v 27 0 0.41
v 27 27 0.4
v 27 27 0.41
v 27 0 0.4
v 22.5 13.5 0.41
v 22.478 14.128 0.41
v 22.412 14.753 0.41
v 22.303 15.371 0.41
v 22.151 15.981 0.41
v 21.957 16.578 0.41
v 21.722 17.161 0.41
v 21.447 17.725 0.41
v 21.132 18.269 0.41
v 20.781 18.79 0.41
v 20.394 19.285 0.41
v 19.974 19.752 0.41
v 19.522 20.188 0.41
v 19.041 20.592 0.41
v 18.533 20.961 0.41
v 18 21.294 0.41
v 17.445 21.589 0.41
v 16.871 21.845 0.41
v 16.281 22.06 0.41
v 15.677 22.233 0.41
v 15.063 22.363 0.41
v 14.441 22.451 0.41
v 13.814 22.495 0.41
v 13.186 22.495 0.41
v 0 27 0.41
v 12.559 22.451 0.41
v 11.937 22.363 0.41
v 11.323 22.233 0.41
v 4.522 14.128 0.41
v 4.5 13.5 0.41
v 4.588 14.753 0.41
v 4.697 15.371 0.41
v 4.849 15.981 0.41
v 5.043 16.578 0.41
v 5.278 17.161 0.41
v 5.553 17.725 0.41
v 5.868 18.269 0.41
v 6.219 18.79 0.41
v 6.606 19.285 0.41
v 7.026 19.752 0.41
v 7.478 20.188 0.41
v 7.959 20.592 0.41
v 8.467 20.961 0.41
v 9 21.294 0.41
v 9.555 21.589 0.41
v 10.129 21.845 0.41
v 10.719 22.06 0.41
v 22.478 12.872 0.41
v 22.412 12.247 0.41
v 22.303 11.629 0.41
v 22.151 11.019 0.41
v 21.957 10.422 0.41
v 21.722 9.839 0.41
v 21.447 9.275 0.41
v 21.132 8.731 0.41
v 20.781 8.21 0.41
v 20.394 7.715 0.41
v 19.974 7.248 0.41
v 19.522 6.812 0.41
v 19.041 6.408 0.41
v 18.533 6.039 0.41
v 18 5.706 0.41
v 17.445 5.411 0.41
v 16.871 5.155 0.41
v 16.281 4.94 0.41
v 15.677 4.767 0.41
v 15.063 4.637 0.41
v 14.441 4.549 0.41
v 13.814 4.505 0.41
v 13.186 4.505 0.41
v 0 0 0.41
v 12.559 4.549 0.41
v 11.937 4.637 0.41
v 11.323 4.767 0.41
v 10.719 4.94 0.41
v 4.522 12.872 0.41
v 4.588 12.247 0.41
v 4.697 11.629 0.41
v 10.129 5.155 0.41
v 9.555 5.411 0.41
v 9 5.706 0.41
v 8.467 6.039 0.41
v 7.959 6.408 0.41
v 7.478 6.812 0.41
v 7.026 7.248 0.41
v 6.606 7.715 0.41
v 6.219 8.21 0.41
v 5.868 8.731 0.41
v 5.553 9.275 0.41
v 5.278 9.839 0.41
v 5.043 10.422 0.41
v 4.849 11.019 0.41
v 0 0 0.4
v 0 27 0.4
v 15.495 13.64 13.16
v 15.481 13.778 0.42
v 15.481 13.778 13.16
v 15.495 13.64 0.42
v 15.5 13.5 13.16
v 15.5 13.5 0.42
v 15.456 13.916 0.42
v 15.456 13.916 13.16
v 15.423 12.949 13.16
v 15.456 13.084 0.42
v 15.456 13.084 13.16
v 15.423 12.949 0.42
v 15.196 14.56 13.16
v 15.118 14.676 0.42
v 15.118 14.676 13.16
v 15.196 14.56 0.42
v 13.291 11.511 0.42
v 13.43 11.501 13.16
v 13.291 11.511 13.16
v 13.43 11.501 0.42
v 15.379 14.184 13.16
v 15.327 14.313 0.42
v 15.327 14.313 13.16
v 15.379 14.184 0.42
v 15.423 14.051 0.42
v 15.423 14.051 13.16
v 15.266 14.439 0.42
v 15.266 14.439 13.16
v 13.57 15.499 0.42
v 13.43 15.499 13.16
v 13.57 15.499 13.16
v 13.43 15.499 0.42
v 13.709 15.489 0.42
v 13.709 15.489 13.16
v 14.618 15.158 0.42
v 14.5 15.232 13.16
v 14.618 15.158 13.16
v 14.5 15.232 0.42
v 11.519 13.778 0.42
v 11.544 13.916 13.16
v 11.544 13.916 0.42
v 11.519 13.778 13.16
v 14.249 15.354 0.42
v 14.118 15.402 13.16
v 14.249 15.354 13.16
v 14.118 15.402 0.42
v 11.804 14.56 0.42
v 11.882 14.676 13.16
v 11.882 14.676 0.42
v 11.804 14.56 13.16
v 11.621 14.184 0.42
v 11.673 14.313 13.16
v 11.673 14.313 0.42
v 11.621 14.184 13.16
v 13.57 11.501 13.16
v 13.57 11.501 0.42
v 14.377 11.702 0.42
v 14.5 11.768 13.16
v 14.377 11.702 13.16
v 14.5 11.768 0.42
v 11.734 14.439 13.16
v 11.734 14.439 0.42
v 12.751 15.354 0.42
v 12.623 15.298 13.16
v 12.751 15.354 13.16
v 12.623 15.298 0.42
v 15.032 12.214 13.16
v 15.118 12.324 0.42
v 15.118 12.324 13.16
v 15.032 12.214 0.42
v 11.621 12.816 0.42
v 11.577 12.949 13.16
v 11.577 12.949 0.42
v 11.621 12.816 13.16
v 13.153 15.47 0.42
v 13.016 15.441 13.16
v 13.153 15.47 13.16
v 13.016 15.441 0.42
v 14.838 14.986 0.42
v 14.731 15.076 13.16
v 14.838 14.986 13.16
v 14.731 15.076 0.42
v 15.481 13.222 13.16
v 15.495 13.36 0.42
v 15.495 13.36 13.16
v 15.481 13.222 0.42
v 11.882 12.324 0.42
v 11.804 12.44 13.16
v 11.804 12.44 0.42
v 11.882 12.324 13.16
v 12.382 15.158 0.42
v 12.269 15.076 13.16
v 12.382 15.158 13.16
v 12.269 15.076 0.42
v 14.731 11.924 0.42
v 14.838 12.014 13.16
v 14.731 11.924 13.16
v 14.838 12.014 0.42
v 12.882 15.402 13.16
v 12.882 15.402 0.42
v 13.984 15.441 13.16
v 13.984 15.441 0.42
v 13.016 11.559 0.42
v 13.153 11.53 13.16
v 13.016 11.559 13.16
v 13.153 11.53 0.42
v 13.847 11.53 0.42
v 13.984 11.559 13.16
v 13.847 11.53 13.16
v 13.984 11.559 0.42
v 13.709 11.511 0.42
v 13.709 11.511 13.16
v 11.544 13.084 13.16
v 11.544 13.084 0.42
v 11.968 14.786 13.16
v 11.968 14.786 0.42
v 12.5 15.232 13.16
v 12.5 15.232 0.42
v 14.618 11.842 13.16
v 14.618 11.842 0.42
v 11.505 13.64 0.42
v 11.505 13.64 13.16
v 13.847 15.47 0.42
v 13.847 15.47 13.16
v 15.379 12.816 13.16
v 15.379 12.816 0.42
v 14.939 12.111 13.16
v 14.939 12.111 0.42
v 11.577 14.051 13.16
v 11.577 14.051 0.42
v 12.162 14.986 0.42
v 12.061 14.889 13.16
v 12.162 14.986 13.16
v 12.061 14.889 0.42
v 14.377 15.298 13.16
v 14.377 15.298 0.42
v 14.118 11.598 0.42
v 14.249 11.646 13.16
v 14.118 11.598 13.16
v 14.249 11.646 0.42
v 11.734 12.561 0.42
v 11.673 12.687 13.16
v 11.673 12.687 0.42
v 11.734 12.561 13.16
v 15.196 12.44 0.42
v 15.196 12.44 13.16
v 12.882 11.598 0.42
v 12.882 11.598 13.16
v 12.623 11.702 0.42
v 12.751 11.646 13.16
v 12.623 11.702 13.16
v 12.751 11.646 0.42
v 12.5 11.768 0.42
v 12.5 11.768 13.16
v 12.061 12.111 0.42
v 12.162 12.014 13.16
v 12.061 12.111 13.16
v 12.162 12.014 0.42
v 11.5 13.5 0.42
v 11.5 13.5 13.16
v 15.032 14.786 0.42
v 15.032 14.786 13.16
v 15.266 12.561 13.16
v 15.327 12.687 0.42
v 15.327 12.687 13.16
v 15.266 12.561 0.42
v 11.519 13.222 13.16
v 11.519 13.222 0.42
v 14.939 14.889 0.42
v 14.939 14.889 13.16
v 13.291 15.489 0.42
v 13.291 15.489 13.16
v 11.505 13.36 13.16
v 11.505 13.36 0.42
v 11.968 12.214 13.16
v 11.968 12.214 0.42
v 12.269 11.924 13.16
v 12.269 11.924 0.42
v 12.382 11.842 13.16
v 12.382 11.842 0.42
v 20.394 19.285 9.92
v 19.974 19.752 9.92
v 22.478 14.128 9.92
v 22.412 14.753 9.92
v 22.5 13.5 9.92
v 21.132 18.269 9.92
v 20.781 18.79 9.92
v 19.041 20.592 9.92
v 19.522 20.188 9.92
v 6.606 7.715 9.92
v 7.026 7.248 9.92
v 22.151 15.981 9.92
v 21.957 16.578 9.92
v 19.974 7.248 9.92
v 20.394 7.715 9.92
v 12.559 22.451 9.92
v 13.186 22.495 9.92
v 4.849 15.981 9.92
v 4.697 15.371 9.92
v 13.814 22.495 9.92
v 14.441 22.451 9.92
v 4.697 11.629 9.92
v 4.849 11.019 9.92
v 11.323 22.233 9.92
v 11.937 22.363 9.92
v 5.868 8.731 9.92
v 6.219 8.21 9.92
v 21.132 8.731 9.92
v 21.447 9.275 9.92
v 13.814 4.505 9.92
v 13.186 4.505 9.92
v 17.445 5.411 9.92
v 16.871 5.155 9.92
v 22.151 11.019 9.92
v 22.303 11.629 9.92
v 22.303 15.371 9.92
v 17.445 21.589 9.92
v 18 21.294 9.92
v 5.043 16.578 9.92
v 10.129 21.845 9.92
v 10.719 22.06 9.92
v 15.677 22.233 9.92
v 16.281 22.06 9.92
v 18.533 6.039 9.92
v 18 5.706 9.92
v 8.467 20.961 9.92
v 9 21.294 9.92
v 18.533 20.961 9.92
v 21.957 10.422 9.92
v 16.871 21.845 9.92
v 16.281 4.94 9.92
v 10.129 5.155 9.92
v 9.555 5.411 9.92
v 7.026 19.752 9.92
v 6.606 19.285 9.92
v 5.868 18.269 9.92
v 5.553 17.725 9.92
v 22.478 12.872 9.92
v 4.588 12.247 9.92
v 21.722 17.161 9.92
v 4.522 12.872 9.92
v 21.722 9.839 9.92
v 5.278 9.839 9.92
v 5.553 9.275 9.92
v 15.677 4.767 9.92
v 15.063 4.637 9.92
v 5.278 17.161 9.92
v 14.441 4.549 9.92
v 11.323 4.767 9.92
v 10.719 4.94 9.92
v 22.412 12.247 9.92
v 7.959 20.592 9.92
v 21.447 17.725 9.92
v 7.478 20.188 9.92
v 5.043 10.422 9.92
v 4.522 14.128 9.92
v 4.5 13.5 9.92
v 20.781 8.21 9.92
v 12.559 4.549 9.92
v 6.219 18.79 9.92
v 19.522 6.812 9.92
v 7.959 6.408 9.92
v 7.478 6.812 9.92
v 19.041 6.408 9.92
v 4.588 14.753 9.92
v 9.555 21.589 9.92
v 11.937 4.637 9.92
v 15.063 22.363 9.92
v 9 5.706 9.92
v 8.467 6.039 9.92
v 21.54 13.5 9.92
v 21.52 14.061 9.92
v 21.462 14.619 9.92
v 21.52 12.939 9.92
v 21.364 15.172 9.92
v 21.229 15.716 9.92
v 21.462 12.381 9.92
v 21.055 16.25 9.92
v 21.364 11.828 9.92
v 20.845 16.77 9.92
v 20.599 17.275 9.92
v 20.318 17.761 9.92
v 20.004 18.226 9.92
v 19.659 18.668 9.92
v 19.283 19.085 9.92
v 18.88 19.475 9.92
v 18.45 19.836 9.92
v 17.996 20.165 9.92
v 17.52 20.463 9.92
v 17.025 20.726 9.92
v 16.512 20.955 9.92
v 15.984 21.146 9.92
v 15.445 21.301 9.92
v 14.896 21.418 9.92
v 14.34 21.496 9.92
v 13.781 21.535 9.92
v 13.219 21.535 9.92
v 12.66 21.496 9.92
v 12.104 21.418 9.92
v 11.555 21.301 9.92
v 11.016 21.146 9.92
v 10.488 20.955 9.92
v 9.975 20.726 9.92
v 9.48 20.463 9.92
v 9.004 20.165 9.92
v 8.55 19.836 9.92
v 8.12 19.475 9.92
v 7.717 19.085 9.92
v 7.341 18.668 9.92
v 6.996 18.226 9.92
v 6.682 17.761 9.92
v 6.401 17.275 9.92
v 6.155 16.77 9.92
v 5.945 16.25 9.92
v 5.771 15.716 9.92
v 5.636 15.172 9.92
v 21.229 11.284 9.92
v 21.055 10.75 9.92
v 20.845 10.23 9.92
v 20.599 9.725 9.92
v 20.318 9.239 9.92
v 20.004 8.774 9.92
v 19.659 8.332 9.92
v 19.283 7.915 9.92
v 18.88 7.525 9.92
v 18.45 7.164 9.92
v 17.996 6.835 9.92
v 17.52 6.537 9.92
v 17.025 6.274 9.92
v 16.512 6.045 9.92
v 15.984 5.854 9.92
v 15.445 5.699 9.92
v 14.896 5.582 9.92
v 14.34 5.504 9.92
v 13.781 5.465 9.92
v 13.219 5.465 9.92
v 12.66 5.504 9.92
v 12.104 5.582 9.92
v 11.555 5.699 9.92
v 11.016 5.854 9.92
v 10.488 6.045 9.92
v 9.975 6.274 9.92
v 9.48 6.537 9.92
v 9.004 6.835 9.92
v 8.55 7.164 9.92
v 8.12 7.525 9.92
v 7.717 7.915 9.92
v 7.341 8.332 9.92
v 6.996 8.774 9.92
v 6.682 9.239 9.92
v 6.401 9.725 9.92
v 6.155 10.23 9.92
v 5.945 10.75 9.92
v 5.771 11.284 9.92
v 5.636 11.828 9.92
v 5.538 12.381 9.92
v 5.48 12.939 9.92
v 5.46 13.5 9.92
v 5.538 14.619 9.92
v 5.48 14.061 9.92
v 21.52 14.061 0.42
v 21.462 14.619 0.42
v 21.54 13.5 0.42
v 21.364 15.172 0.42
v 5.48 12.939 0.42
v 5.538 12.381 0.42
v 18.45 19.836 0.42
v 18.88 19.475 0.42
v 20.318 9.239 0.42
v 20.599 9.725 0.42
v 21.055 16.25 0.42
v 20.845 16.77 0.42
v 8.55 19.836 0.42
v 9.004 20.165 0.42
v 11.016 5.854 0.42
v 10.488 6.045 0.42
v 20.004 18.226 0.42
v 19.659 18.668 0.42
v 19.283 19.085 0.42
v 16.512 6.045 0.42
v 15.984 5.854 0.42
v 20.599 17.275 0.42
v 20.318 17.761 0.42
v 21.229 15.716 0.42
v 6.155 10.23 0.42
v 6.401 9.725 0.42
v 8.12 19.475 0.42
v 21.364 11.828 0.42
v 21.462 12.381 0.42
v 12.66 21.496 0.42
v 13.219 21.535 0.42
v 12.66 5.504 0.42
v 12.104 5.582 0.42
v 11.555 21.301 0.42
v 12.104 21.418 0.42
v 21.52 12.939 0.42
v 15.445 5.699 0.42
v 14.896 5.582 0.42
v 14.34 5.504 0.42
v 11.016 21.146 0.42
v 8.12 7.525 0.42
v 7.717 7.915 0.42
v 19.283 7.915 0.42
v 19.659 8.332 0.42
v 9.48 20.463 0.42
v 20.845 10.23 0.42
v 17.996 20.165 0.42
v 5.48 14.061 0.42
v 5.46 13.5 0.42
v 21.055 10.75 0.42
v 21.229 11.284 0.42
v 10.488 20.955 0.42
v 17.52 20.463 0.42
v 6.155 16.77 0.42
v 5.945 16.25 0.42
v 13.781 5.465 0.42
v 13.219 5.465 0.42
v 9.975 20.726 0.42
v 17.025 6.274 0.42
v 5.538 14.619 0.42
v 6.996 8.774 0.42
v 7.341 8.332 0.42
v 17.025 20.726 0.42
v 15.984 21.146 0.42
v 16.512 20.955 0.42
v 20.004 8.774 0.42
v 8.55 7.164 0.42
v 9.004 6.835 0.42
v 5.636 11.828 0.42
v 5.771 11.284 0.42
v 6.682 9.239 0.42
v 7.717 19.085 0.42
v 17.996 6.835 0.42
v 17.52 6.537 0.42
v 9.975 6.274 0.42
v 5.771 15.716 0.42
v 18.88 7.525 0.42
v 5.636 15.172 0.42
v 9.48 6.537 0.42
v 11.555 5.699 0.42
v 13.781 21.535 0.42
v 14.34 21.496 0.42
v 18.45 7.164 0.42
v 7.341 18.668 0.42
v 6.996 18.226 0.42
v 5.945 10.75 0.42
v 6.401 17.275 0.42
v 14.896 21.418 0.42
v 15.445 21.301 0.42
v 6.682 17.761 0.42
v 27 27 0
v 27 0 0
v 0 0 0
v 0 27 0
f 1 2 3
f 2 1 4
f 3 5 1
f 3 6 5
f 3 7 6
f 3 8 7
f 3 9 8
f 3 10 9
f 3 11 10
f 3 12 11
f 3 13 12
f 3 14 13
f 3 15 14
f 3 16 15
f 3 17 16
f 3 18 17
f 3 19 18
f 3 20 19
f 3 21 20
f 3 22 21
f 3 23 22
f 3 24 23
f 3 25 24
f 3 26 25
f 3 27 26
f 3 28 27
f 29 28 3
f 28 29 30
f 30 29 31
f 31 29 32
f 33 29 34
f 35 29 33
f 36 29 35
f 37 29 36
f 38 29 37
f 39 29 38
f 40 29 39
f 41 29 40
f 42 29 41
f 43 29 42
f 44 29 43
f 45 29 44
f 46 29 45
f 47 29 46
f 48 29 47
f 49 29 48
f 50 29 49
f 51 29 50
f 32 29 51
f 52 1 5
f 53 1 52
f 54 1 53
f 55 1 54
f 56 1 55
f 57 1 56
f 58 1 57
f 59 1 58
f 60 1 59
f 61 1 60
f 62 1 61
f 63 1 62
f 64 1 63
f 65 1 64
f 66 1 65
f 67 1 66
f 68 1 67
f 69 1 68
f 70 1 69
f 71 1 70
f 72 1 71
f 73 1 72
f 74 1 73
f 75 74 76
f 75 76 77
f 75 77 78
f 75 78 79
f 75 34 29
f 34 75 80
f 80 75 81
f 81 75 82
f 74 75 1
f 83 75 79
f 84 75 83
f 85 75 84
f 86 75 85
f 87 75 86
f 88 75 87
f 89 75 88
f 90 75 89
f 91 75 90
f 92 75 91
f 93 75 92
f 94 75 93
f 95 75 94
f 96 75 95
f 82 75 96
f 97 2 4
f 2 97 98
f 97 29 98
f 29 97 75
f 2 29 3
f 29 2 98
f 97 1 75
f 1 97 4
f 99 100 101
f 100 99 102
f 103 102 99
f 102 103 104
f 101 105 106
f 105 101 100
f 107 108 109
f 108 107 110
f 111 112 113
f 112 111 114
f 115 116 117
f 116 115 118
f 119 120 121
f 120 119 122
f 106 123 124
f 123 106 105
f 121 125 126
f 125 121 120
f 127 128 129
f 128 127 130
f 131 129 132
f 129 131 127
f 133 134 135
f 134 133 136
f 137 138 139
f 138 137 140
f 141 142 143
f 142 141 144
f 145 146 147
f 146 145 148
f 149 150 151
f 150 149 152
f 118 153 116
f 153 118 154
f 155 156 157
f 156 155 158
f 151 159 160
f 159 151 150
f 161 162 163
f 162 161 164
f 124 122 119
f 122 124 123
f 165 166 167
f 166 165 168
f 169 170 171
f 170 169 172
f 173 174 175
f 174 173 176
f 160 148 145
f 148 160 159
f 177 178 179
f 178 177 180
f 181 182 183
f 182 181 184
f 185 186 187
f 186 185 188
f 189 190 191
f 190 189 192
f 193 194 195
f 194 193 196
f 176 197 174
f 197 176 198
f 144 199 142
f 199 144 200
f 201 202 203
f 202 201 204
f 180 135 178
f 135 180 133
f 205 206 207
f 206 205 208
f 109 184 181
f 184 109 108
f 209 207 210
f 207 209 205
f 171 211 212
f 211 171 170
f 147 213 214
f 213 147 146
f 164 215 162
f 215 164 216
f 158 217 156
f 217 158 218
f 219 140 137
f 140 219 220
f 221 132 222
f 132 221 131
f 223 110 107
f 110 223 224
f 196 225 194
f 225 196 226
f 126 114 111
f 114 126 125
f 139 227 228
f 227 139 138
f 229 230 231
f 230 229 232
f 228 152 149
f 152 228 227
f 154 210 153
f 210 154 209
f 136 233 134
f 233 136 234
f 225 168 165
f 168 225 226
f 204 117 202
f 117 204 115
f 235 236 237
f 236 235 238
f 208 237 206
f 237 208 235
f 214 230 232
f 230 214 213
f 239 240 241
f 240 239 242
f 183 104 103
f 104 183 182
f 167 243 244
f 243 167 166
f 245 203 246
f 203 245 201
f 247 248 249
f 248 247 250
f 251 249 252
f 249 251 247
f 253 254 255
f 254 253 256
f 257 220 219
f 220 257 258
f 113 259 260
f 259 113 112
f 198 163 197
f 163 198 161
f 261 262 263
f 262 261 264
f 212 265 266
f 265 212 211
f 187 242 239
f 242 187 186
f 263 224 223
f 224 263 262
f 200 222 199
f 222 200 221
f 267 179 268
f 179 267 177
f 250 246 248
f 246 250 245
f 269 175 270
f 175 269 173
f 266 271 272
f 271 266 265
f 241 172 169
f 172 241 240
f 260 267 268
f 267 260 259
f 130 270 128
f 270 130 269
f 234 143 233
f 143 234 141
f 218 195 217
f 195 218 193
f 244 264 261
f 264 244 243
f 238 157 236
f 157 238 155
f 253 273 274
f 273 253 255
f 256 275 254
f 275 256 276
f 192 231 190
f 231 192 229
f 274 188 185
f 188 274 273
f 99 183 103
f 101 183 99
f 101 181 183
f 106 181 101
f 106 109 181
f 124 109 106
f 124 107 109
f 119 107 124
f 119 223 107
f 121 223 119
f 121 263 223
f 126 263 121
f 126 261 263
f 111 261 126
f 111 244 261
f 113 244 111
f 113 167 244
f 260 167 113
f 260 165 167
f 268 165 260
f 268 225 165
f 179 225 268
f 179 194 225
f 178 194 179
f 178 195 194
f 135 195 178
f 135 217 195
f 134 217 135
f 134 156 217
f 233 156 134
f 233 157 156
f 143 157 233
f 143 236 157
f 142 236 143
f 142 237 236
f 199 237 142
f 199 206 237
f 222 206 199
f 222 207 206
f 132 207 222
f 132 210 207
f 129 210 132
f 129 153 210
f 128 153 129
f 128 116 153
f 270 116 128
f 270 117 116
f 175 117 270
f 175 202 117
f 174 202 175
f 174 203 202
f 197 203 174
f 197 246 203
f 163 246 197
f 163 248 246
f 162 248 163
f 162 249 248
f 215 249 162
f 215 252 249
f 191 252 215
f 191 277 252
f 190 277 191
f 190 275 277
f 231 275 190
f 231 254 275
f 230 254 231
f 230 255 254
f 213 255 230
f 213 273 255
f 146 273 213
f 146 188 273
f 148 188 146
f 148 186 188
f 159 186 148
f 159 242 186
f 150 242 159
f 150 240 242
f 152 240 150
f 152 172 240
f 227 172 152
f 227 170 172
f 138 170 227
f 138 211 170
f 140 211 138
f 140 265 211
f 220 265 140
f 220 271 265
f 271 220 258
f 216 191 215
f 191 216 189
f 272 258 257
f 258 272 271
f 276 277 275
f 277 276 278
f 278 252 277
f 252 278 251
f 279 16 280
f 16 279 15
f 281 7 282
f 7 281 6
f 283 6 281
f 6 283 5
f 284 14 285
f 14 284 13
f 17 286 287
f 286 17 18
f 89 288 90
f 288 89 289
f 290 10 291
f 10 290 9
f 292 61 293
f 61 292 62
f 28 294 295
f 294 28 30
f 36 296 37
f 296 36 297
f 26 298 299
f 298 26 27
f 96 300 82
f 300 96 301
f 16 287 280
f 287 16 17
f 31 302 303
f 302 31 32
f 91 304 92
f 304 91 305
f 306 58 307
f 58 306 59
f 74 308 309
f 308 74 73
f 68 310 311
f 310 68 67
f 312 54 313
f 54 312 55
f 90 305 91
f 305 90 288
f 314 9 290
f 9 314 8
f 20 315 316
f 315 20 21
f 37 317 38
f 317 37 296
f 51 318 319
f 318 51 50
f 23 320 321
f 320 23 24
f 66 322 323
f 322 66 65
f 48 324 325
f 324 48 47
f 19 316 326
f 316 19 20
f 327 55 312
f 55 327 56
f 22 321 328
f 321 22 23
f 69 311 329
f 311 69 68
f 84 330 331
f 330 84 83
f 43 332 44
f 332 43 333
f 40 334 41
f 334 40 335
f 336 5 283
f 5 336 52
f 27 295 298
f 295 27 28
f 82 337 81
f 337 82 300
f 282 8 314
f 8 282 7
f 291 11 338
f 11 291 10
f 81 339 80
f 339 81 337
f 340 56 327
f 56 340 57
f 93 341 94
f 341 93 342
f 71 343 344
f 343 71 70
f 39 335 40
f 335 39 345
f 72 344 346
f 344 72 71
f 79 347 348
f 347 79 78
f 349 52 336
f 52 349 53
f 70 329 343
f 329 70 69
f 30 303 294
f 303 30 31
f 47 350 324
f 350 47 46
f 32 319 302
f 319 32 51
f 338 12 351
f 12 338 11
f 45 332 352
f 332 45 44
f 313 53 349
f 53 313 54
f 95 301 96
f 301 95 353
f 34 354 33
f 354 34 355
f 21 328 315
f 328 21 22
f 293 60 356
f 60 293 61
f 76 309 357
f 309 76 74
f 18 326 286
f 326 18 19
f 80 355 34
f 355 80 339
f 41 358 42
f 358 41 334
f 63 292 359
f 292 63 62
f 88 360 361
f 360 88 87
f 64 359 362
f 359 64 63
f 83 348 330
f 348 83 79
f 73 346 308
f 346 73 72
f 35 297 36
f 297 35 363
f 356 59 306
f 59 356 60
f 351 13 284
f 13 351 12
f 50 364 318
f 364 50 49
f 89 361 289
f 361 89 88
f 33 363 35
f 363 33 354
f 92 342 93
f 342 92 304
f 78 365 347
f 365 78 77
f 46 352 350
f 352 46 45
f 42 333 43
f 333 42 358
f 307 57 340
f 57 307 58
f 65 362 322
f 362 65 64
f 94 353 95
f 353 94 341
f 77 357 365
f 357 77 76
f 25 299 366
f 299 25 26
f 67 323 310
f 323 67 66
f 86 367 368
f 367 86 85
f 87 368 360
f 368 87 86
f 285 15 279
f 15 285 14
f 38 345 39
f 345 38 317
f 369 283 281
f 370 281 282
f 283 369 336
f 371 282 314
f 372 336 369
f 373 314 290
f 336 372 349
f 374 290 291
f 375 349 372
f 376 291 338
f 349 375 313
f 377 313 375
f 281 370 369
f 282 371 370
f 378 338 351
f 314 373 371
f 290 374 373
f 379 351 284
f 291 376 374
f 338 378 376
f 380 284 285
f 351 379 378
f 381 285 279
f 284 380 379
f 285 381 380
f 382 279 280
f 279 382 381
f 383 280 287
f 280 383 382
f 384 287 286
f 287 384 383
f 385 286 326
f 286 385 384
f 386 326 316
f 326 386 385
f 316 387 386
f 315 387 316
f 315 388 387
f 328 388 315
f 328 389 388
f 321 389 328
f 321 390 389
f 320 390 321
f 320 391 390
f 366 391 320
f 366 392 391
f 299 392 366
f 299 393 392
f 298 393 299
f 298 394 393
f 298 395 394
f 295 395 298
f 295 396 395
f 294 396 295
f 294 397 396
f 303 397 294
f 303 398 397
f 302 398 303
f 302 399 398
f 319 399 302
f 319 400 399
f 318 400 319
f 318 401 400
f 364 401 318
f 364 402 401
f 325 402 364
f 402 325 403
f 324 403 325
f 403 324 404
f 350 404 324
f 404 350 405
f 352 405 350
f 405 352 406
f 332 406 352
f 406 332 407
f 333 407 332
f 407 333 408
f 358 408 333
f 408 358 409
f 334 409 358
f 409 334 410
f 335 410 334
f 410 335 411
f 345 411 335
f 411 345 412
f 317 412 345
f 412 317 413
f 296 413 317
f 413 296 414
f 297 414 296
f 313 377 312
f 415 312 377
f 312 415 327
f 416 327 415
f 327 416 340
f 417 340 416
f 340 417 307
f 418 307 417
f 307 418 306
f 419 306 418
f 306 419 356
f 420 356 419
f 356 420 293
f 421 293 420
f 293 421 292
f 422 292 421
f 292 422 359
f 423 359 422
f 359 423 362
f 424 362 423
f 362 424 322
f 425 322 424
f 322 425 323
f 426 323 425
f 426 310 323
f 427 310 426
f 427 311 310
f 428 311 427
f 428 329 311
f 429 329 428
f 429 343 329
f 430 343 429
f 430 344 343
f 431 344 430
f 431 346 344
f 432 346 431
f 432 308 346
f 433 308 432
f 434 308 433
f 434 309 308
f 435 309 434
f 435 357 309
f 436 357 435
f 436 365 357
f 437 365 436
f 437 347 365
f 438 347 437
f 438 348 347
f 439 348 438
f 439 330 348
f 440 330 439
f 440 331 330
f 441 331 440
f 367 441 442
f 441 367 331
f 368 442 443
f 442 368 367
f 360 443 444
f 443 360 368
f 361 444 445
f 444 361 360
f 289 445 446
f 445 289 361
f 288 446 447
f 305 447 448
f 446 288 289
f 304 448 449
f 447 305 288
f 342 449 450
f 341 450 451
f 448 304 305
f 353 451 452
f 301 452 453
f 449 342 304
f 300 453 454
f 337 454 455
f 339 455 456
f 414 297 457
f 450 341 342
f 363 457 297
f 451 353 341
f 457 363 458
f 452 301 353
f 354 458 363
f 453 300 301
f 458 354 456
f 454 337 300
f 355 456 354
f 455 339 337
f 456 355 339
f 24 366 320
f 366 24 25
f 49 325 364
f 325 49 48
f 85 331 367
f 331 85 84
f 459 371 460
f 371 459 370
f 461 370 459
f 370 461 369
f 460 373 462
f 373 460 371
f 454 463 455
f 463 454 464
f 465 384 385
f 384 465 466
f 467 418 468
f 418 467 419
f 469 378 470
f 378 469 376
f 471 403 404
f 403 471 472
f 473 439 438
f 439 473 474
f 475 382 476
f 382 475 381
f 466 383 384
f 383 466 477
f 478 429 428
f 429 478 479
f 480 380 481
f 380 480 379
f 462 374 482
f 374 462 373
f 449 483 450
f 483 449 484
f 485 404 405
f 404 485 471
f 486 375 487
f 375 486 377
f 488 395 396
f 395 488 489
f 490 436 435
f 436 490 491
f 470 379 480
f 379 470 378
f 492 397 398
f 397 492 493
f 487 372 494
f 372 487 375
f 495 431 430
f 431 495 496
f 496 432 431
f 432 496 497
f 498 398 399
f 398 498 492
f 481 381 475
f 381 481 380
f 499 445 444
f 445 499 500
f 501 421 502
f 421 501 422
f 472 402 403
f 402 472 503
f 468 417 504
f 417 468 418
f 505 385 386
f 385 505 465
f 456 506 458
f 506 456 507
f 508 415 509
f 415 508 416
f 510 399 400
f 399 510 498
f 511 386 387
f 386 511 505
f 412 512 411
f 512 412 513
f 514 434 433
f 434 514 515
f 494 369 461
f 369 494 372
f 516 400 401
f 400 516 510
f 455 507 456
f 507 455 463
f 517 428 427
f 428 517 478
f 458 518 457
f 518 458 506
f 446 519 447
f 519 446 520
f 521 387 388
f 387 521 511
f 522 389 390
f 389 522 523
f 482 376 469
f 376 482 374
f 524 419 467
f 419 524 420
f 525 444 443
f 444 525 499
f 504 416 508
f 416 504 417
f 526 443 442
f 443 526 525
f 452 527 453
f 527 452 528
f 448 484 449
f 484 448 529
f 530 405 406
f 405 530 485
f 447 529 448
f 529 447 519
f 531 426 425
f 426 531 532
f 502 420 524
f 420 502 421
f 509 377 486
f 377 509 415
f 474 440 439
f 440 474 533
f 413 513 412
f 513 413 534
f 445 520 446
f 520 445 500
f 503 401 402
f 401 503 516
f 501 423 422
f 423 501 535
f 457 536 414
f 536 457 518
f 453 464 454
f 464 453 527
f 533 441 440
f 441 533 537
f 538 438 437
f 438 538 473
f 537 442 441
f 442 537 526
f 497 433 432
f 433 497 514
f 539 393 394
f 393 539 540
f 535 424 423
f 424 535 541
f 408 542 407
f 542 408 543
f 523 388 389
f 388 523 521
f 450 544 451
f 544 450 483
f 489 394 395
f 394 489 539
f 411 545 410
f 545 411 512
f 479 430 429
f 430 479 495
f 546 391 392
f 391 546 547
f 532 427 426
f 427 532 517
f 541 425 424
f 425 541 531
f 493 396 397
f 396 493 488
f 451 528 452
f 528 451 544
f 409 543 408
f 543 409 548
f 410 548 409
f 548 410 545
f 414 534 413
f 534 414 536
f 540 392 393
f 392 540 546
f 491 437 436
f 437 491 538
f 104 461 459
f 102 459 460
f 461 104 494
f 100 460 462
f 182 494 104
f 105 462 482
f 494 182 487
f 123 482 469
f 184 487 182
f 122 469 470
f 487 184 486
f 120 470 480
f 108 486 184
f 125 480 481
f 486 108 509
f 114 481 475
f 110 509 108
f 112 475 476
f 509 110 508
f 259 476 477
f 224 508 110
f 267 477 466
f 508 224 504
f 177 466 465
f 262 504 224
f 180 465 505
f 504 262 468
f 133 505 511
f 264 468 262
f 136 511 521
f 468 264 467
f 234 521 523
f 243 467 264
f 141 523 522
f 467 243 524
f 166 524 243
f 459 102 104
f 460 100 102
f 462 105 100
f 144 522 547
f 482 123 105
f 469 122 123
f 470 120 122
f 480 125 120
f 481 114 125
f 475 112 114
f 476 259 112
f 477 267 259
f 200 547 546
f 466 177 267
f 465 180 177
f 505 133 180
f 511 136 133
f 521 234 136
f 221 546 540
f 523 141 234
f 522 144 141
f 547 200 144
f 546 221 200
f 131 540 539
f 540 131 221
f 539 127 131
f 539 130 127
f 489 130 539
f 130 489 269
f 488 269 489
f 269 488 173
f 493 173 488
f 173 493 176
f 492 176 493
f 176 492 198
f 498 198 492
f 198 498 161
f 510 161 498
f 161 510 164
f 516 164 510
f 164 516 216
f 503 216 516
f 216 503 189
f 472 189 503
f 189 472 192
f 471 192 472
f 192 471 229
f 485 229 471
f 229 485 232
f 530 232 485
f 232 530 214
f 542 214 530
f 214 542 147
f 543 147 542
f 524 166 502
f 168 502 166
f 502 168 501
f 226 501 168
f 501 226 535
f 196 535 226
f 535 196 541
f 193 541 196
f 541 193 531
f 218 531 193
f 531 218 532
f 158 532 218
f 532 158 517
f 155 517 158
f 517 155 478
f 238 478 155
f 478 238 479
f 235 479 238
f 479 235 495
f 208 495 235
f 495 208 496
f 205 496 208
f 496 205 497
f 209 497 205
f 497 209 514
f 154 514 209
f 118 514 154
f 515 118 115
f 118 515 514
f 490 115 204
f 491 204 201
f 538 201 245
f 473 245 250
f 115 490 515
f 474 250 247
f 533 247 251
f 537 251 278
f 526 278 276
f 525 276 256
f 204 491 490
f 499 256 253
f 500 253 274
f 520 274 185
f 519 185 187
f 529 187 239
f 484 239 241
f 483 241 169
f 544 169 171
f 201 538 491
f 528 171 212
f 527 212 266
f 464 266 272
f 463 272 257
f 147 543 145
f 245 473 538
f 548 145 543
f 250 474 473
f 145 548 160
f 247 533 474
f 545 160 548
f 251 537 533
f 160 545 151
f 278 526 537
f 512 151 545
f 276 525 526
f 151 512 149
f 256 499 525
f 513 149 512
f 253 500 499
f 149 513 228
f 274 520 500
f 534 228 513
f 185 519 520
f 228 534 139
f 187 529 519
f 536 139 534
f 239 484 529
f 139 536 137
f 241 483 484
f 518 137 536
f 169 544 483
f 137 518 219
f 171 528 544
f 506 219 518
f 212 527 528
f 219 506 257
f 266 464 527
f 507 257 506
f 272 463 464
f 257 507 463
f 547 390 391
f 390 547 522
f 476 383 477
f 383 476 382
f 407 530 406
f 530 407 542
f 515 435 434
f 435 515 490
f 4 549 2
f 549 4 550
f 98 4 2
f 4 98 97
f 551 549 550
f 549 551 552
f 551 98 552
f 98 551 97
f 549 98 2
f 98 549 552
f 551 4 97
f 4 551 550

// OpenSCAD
// file: ../../Base/PlacementOptions.scad
// Fischertechnik Box Foundation
// Placement Options

// Alignment
NoAlign = 0;
AlignLeft = 1;
AlignBottom = 2;
AlignCenter = 3;
AlignRight = 4;
AlignTop = 5;

// Element rotation degree steps
rotations = [0, -90, -180, -270];

// Rotation
NoRotation = 0;
Rotate0 = 0;
Rotate90 = 1;
Rotate180 = 2;
Rotate270 = 3;

// Docking (seen from above)
NoDock = -1;
DockLeft = 0;
DockTop = 1;
DockRight = 2;
DockCorner = 2;
DockBottom = 3;

// Web corners
LowerLeft = 0;
UpperLeft = 1;
UpperRight = 2;
LowerRight = 3;

// Web position relative to corner
LeftOfCorner = 0;
RightOfCorner = 1;
// file: ../../Base/Boxes.scad
// Fischertechnik Box Foundation
// Pre-designed Boxes

use <Constants.scad>

include <PlacementOptions.scad>

box190Width = 190;
box190Depth = 130;
box130Width = 130;
box130Depth = 95;

// Values are from an original ec3 box
topBottomDifference = 1.5;
outerHeight = 40;
innerHeight = 38.2;
baseThickness = outerHeight - innerHeight;
stackExcess = 5.7;
radius = 3.5;
wallThickness = 1.5;
tolerance = 0.2;
stackOffset = innerHeight - stackExcess;

boxUsageHeight = stackOffset;
boxWallThickness = wallThickness;
boxBaseThickness = baseThickness;
boxWebWidth = 3.0;

// getBoxWallThickness()
// Gets the wall thickness of a Fischertechnik Box
function getBoxWallThickness() = boxWallThickness;

// getBoxUsageHeight()
// Gets the usable height of a Fischertechnik box
function getBoxUsageHeight() = boxUsageHeight;

// getBoxInnerHeight()
// Gets the inner height of a Fischertechnik box, including the stack excess
function getBoxInnerHeight() = innerHeight;

// getBoxBaseThickness()
// Gets the thickness of the Fischertechnik box base.
function getBoxBaseThickness() = boxBaseThickness;

// getBoxWebWidth()
// Gets the width of a box web
function getBoxWebWidth() = boxWebWidth;

// getBox190Space()
// Gets the usable inner space of a Box 190 as an x/y-list
function getBox190Space() = [
    box190Width - 2*getBoxWallThickness() - topBottomDifference, 
    box190Depth - 2*getBoxWallThickness() - topBottomDifference ];

// BoxBase(width, depth)
// Creates an empty stackable Fischertechnik compatible box
// width = Outer width of the box (190, 130, ...)
// depth = Outer depth of the box (130, 95, ...)

module BoxBase(width, depth, height=outerHeight) {    
    thinPlate = 0.01;

    innerHeight = height - baseThickness;    
    
    module BodyPlate(width, depth) {
        translate([radius, radius])
        hull() {
            w = width-2*radius;
            d = depth-2*radius;
            cube([w, d, thinPlate]);
            cylinder(thinPlate, r=radius, $fn=getFragments());
            translate([w, 0])
                cylinder(thinPlate, r=radius, $fn=getFragments());
            translate([w, d])
                cylinder(thinPlate, r=radius, $fn=getFragments());
            translate([0, d])
                cylinder(thinPlate, r=radius, $fn=getFragments());
        }
    }
    
    module Body(tolerance=tolerance) {
        hull() {
            // Bottom with tolerance to fit into the original boxes when stacked
            translate([-wallThickness+tolerance, -wallThickness+tolerance, -baseThickness])
                BodyPlate(width-topBottomDifference-2*tolerance, depth-topBottomDifference-2*tolerance);
            
            // Top
            translate([-wallThickness-topBottomDifference/2, -wallThickness-topBottomDifference/2, innerHeight-thinPlate])
                BodyPlate(width, depth);
         }
    }

    module Cutoff() {
        hull() {
            coWidth = width - 2*wallThickness;
            coDepth = depth - 2*wallThickness;
            
            // Bottom
            BodyPlate(coWidth-topBottomDifference, coDepth-topBottomDifference);

            // Top
            translate([-topBottomDifference/2, -topBottomDifference/2, innerHeight+thinPlate]) 
                BodyPlate(coWidth, coDepth);
        }
    }
    
    difference() {        
        Body();
        Cutoff();
        stackOffset = innerHeight - stackExcess;
        translate([0, 0, stackOffset + baseThickness])
            Body(tolerance=0);
    }
}

// Creates the Fischertechnik empty box 130x190 mm and places it at position 0,0
// 190x130 are the outer sizes, the inner space is slightly smaller. Use getBox190Space() to get the inner sizes.
// The box is positioned that the usable inner space is at the 0,0,0 position. The

module Box190() {
    BoxBase(box190Width, box190Depth);
}

// Gets the usable inner space of a Box 130 as an x/y-list
function getBox130Space() = [
    box130Width - 2*getBoxWallThickness() - topBottomDifference, 
    box130Depth - 2*getBoxWallThickness() - topBottomDifference ];

// Creates the Fischertechnik empty box 95x130 mm and places it at position 0,0
// 190x130 are the outer sizes, the inner space is slightly smaller. Use getBox190Space() to get the inner sizes.
// The box is positioned that the usable inner space is at the 0,0,0 position. The

module Box130() {
    BoxBase(box130Width, box130Depth);
}

// Creates a web at the specified box walls
// corner 0 = LowerLeft, 1 = UpperLeft, 2 = UpperRight, 3 = LowerRight
// side 0 = LeftOfCorner, 1 = RightOfCorner
// distance = Distance in mm from the corner
// boxSpace = inner width and depth of the box (default: Box 190)
// webWidth = length of the web (default is 3 mms)
// webThickness = thickness of the web (default is 1 mm)

module BoxWeb(corner, side, distance, boxSpace=getBox190Space(), webWidth=getBoxWebWidth(), webThickness=1.0) {
    sink = getBoxWallThickness()/2;

    width = (corner % 2 == 0) ? 
            (side == LeftOfCorner ? webWidth : webThickness) :
            (side == LeftOfCorner ? webThickness : webWidth);

    depth = (corner % 2 == 0) ? 
            (side == RightOfCorner ? webWidth : webThickness) :
            (side == RightOfCorner ? webThickness : webWidth);
    
    xDiff = corner == LowerLeft ? 
                (side == LeftOfCorner ? -sink : distance) :
            (corner == UpperLeft ?                
                (side == LeftOfCorner ? distance : -sink) :
            (corner == UpperRight ?
                (side == LeftOfCorner ? boxSpace.x-webWidth+sink : boxSpace.x-distance-webThickness) :
                (side == LeftOfCorner ? boxSpace.x-distance-webThickness: boxSpace.x-webWidth+sink)));

    yDiff = corner == LowerLeft ? 
                (side == RightOfCorner ? -sink : distance) :
            (corner == UpperLeft ?
                (side == RightOfCorner ? boxSpace.y-distance : boxSpace.y-webWidth+sink) :
            (corner == UpperRight ?
                (side == RightOfCorner ? boxSpace.y-webWidth+sink : boxSpace.y-distance) :
                (side == RightOfCorner ? distance : -sink)));
    
    translate([xDiff, yDiff, -getExcess()])
        cube([width, depth, boxUsageHeight + 2*getExcess()]);
}
// file: ../../Base/Rotation.scad
// Fischertechnik Box Foundation
// Geometry Helpers Rotation

include <PlacementOptions.scad>

// getRotatedSpace(space, rotation=NoRotation)
// Rotates the space dependent on the specified rotation

function getRotatedSpace(space, rotation=NoRotation) = [
    (rotation == Rotate90 || rotation == Rotate270) ? space.y : space.x,
    (rotation == Rotate90 || rotation == Rotate270) ? space.x : space.y
];

// Rotates the given space around the fixed left lower corner
// space = the space the children needs as width/depth list [width,depth]
// rotation = 0 Rotate0 degrees, 1 Rotate90 degrees, 2 Rotate180 degrees, 3 Rotate270 degrees (equivalent to -90)

module RotateFix(space, rotation=NoRotation) {
    dy = (rotation == Rotate0 || rotation == Rotate270) ? 0 :
        (rotation == Rotate90) ? space.x :
        space.y;
    dx = (rotation < Rotate180) ? 0 :
        (rotation == Rotate180) ? space.x :
        space.y;
    
    translate([dx, dy, 0])
        rotate([0, 0, rotations[rotation]])
            children();
}
// file: ../../Base/Alignment.scad
// Fischertechnik Box Foundation
// Geometry Helpers Alignment

include <PlacementOptions.scad>

// getAlignedX(elementWidth, spaceWidth, align=AlignRight, offset=0)
// Gets the aligned X offset of an element with the given
// width in the given space.
// elementWidth = The width of the element to positon
// spaceWidth = The space where the element should be aligned
// align = 0 AlignLeft, 1 AlignCenter, 2 AlignRight
// offset = an optional offset from the aligned position. When
// aligned left or centered, then positive values are in X direction.
// When aligned right then positive values are in negative X direction.

function getAlignedX(elementWidth, spaceWidth, align=AlignRight, offset=0) =
    (align == AlignLeft) ?
        offset :
        ((align == AlignCenter) ?
        (spaceWidth - elementWidth)/2 + offset :
        spaceWidth - offset - elementWidth);

// getAlignedY(elementDepth, spaceDepth, align=AlignTop, offset=0)
// Gets the aligned Y offset of an element with the given
// depth in the given space.
// elementDepth = The depth of the element to positon
// spaceDepth = The space where the element should be aligned
// align = 0 AlignBottom, 1 AlignCenter, 2 AlignTop
// offset = an optional offset from the aligned position. When
// aligned bottom or centered, then positive values are in Y direction.
// When aligned top then positive values are in negative Y direction.

function getAlignedY(elementDepth, spaceDepth, align=AlignTop, offset=0) =
    (align == AlignBottom) ?
        offset :
        ((align == AlignCenter) ?
        (spaceDepth - elementDepth)/2 + offset :
        spaceDepth - offset - elementDepth);
// file: ../../Base/Placement.scad
// Fischertechnik Box Foundation
// Geometry Helpers Placement

use <Constants.scad>
use <Alignment.scad>
use <Rotation.scad>
use <Boxes.scad>

include <PlacementOptions.scad>

// Place(x=0, y=0, elementSpace=[0,0], alignX=AlignLeft, alignY=AlignBottom, rotation=Rotate0, boxSpace=getBox190Space())
// Places the child at the specified position
// y = Y-Position. This is a relative position when an X aligment is specified.
// x = X-Position. This is a relative position when an Y aligment is specified.
// elementSpace = space of the element to be placed [x,y]
// alignX = -1=NoAlign, 0 AlignLeft, 1 AlignCenter, 3 AlignRight (elementSpace and boxSpace required!)
// alignY = -1=NoAlign, 2 AlignBottom, 1 AlignCenter, 4 AlignTop (elementSpace and boxSpace required!)
// rotation = 0 Rotate0 0 degrees, 1 Rotate90 90 degrees, 
// 2 Rotate180 180 degrees, 3 Rotate270 270 degrees (equivalent to -90)
// boxSpace = Inner space of the box where the placement occurs [x,y] - default is Box 190x130 inner space

module Place(x=0, y=0, elementSpace=[0,0], 
  alignX=AlignLeft, alignY=AlignBottom, 
  rotation=NoRotation, boxSpace=getBox190Space()) {

    module Position(x, y, space, rotation=Rotate0) {
        translate([x, y, 0])
            RotateFix(space, rotation)
                children();
    }

    space = getRotatedSpace(elementSpace, rotation);
    alignedX = getAlignedX(space.x, boxSpace.x, alignX, x);
    alignedY = getAlignedY(space.y, boxSpace.y, alignY, y);
    Position(alignedX, alignedY, elementSpace, rotation)
        children();
}

// Center(space=getBox130Space(), elementSpace=[0,0])
// space = Space where the children is centered. For cylinder use centered=true and no elementSpace.
// elementSpace = space of the element to be centered [x,y]

module Center(space=getBox190Space(), elementSpace=[0,0]) {
    Place(elementSpace=elementSpace, boxSpace=space, alignX=AlignCenter, alignY=AlignCenter)
        children();
}

// CenterHorizontal(width=0, y=0, offset=0, space=getBox130Space())
// width = Width of the element to be placed.
// y = Y position of the element
// offset = Offset from the center position (negative will be left of the center)
// space = Space where the element is placed

module CenterHorizontal(width=0, y=0, offset=0, space=getBox190Space()) {
    Place(x=offset, y=y, elementSpace=[width, 0], boxSpace=space, alignX=AlignCenter)
        children(0);
}

// CenterVertical(depth=0, x=0, offset=0, space=getBox130Space())
// depth = Depth of the element to be placed.
// x = X position of the element
// offset = Offset from the center position (negative will be down of the center)
// space = Space where the element is placed

module CenterVertical(depth=0, x=0, offset=0, space=getBox190Space()) {
    Place(x=x, y=offset, elementSpace=[0, depth], boxSpace=space, alignY=AlignCenter)
        children(0);
}

// getIsVertical(align)
// True if the specified alignment needs a vertical orientation for a divider (AlignRight, AlignLeft)

function getIsVertical(align) = (align == AlignRight || align == AlignLeft);

// getIsHorizontal(align)
// True if the specified alignment needs a horizontal orientation for a divider (AlignTop, AlignBottom)

function getIsHorizontal(align) = (align == AlignTop || align == AlignBottom);
// file: ../../Elements/AxisClip10.scad
// Fischertechnik Box Library
// Axis for clip 10
// 31023

use <../ModelBase/Simple.scad>
use <../Base/Constants.scad>

width = 12;
depth = 12;
height = 23;
upperDiameter = 3.6;
clipHeight = 10;

// getAxisClip10Space()
// Gets the space of a frame for a clip 10 with spring ring (mot2)

function getAxisClip10Space() = [width, depth, height];

// AxisClip10(height, clipHeight)
// Axis for clip 10 with spring ring (mot2)
// height = Height of the complete axis
// clipHeight = Height of the rt for the clip (standard is 10, in mot3 its only 7)

module AxisClip10(height=height, clipHeight=clipHeight) {
    LeveledAxisWithSpace(height, height-clipHeight, getAxisClip10Space(), diameter=upperDiameter);
}

// Tests
color("lightgray")
AxisClip10();
// file: ../../Base/Constants.scad
// Fischertechnik Box Foundation
// Constants

// Constant values necessary for multiple elements

// Base constants
dividerThickness = 1.2;
excess = 0.01;
fragments = 90;
tolerance = 0.8;

// Gets the thickness of a divider 
function getDividerThickness() = dividerThickness;

// Gets the excess that is used to merge walls into each other
function getExcess() = excess;

// Gets amount of fragments of a cylinder
function getFragments() = fragments;

// Gets the inner tolerance of a frame to each side
function getTolerance() = tolerance;


// Fischertechnik specific constants
axisDiameter = 4;
axisBottomDiameter = axisDiameter + 1;
standardEdgeDistance = 2.5;
standardWebDistance = 11.5;
standardCornerLength = 15;
tubeWallFactor = 0.8;
smallPartsFrameHeight = 20;

// Gets axis diameter
function getAxisDiameter() = axisDiameter;

// Gets axis bottom diameter for thicker part at the bottom
function getAxisBottomDiameter() = axisBottomDiameter;

// gets the standard distance to the wall of the box for dockable frames with webs
function getStandardEdgeDistance() = standardEdgeDistance;

// gets the standard distance of each web to the corner of the dockable frame
function getStandardWebDistance() = standardWebDistance;

// gets the standard length of the corner walls of a dockable frame
function getStandardCornerLength() = standardCornerLength;

// gets the wall thickness of a tube.
function getTubeWallThickness() = tubeWallFactor * getDividerThickness();

// gets the frame height for docked small parts boxes.
function getSmallPartsFrameHeight() = smallPartsFrameHeight;
// file: ../../Elements/AxisAndCylinderIdlerGearZ15.scad
// Fischertechnik Box Library
// Axis with cylinder for idler gear Z15
// 35695

use <../Base/Placement.scad>
use <../ModelBase/Simple.scad>

width = 27;
depth = 27;
height = 12.75;

// getAxisAndCylinderIdlerGearZ15Space()
// Gets the space of an axis for an idler gear Z15 (mot2)

function getAxisAndCylinderIdlerGearZ15Space() = [width, depth, height];

// AxisAndCylinderIdlerGearZ15()
// Axis for for an idler gear Z15 (mot2)

module AxisAndCylinderIdlerGearZ15() {
    AxisWithSpace(height, getAxisAndCylinderIdlerGearZ15Space());

    cylinderHeight = 9.5;
    diameter = 18;
    Center(getAxisAndCylinderIdlerGearZ15Space())
        Tube(cylinderHeight, outerDiameter=diameter);
}

// Tests
color("lightgray")
AxisAndCylinderIdlerGearZ15();
// file: ../TestPrint.scad
// 3D Print Test Base

use <../Base/Constants.scad>

use <../Elements/AxisClip10.scad>

module TestPrint(elementSpace) {
    cube([elementSpace.x, elementSpace.y, 0.4]);
    translate([0,0,0.4+getExcess()]) {
        children();
    }
}

TestPrint(getAxisClip10Space())
    AxisClip10();
// main file
// 3D Print Test
// AxisAndCylinderIdlerGearZ15

use <../TestPrint.scad>
use <../../Elements/AxisAndCylinderIdlerGearZ15.scad>

TestPrint(getAxisAndCylinderIdlerGearZ15Space())
    AxisAndCylinderIdlerGearZ15();
